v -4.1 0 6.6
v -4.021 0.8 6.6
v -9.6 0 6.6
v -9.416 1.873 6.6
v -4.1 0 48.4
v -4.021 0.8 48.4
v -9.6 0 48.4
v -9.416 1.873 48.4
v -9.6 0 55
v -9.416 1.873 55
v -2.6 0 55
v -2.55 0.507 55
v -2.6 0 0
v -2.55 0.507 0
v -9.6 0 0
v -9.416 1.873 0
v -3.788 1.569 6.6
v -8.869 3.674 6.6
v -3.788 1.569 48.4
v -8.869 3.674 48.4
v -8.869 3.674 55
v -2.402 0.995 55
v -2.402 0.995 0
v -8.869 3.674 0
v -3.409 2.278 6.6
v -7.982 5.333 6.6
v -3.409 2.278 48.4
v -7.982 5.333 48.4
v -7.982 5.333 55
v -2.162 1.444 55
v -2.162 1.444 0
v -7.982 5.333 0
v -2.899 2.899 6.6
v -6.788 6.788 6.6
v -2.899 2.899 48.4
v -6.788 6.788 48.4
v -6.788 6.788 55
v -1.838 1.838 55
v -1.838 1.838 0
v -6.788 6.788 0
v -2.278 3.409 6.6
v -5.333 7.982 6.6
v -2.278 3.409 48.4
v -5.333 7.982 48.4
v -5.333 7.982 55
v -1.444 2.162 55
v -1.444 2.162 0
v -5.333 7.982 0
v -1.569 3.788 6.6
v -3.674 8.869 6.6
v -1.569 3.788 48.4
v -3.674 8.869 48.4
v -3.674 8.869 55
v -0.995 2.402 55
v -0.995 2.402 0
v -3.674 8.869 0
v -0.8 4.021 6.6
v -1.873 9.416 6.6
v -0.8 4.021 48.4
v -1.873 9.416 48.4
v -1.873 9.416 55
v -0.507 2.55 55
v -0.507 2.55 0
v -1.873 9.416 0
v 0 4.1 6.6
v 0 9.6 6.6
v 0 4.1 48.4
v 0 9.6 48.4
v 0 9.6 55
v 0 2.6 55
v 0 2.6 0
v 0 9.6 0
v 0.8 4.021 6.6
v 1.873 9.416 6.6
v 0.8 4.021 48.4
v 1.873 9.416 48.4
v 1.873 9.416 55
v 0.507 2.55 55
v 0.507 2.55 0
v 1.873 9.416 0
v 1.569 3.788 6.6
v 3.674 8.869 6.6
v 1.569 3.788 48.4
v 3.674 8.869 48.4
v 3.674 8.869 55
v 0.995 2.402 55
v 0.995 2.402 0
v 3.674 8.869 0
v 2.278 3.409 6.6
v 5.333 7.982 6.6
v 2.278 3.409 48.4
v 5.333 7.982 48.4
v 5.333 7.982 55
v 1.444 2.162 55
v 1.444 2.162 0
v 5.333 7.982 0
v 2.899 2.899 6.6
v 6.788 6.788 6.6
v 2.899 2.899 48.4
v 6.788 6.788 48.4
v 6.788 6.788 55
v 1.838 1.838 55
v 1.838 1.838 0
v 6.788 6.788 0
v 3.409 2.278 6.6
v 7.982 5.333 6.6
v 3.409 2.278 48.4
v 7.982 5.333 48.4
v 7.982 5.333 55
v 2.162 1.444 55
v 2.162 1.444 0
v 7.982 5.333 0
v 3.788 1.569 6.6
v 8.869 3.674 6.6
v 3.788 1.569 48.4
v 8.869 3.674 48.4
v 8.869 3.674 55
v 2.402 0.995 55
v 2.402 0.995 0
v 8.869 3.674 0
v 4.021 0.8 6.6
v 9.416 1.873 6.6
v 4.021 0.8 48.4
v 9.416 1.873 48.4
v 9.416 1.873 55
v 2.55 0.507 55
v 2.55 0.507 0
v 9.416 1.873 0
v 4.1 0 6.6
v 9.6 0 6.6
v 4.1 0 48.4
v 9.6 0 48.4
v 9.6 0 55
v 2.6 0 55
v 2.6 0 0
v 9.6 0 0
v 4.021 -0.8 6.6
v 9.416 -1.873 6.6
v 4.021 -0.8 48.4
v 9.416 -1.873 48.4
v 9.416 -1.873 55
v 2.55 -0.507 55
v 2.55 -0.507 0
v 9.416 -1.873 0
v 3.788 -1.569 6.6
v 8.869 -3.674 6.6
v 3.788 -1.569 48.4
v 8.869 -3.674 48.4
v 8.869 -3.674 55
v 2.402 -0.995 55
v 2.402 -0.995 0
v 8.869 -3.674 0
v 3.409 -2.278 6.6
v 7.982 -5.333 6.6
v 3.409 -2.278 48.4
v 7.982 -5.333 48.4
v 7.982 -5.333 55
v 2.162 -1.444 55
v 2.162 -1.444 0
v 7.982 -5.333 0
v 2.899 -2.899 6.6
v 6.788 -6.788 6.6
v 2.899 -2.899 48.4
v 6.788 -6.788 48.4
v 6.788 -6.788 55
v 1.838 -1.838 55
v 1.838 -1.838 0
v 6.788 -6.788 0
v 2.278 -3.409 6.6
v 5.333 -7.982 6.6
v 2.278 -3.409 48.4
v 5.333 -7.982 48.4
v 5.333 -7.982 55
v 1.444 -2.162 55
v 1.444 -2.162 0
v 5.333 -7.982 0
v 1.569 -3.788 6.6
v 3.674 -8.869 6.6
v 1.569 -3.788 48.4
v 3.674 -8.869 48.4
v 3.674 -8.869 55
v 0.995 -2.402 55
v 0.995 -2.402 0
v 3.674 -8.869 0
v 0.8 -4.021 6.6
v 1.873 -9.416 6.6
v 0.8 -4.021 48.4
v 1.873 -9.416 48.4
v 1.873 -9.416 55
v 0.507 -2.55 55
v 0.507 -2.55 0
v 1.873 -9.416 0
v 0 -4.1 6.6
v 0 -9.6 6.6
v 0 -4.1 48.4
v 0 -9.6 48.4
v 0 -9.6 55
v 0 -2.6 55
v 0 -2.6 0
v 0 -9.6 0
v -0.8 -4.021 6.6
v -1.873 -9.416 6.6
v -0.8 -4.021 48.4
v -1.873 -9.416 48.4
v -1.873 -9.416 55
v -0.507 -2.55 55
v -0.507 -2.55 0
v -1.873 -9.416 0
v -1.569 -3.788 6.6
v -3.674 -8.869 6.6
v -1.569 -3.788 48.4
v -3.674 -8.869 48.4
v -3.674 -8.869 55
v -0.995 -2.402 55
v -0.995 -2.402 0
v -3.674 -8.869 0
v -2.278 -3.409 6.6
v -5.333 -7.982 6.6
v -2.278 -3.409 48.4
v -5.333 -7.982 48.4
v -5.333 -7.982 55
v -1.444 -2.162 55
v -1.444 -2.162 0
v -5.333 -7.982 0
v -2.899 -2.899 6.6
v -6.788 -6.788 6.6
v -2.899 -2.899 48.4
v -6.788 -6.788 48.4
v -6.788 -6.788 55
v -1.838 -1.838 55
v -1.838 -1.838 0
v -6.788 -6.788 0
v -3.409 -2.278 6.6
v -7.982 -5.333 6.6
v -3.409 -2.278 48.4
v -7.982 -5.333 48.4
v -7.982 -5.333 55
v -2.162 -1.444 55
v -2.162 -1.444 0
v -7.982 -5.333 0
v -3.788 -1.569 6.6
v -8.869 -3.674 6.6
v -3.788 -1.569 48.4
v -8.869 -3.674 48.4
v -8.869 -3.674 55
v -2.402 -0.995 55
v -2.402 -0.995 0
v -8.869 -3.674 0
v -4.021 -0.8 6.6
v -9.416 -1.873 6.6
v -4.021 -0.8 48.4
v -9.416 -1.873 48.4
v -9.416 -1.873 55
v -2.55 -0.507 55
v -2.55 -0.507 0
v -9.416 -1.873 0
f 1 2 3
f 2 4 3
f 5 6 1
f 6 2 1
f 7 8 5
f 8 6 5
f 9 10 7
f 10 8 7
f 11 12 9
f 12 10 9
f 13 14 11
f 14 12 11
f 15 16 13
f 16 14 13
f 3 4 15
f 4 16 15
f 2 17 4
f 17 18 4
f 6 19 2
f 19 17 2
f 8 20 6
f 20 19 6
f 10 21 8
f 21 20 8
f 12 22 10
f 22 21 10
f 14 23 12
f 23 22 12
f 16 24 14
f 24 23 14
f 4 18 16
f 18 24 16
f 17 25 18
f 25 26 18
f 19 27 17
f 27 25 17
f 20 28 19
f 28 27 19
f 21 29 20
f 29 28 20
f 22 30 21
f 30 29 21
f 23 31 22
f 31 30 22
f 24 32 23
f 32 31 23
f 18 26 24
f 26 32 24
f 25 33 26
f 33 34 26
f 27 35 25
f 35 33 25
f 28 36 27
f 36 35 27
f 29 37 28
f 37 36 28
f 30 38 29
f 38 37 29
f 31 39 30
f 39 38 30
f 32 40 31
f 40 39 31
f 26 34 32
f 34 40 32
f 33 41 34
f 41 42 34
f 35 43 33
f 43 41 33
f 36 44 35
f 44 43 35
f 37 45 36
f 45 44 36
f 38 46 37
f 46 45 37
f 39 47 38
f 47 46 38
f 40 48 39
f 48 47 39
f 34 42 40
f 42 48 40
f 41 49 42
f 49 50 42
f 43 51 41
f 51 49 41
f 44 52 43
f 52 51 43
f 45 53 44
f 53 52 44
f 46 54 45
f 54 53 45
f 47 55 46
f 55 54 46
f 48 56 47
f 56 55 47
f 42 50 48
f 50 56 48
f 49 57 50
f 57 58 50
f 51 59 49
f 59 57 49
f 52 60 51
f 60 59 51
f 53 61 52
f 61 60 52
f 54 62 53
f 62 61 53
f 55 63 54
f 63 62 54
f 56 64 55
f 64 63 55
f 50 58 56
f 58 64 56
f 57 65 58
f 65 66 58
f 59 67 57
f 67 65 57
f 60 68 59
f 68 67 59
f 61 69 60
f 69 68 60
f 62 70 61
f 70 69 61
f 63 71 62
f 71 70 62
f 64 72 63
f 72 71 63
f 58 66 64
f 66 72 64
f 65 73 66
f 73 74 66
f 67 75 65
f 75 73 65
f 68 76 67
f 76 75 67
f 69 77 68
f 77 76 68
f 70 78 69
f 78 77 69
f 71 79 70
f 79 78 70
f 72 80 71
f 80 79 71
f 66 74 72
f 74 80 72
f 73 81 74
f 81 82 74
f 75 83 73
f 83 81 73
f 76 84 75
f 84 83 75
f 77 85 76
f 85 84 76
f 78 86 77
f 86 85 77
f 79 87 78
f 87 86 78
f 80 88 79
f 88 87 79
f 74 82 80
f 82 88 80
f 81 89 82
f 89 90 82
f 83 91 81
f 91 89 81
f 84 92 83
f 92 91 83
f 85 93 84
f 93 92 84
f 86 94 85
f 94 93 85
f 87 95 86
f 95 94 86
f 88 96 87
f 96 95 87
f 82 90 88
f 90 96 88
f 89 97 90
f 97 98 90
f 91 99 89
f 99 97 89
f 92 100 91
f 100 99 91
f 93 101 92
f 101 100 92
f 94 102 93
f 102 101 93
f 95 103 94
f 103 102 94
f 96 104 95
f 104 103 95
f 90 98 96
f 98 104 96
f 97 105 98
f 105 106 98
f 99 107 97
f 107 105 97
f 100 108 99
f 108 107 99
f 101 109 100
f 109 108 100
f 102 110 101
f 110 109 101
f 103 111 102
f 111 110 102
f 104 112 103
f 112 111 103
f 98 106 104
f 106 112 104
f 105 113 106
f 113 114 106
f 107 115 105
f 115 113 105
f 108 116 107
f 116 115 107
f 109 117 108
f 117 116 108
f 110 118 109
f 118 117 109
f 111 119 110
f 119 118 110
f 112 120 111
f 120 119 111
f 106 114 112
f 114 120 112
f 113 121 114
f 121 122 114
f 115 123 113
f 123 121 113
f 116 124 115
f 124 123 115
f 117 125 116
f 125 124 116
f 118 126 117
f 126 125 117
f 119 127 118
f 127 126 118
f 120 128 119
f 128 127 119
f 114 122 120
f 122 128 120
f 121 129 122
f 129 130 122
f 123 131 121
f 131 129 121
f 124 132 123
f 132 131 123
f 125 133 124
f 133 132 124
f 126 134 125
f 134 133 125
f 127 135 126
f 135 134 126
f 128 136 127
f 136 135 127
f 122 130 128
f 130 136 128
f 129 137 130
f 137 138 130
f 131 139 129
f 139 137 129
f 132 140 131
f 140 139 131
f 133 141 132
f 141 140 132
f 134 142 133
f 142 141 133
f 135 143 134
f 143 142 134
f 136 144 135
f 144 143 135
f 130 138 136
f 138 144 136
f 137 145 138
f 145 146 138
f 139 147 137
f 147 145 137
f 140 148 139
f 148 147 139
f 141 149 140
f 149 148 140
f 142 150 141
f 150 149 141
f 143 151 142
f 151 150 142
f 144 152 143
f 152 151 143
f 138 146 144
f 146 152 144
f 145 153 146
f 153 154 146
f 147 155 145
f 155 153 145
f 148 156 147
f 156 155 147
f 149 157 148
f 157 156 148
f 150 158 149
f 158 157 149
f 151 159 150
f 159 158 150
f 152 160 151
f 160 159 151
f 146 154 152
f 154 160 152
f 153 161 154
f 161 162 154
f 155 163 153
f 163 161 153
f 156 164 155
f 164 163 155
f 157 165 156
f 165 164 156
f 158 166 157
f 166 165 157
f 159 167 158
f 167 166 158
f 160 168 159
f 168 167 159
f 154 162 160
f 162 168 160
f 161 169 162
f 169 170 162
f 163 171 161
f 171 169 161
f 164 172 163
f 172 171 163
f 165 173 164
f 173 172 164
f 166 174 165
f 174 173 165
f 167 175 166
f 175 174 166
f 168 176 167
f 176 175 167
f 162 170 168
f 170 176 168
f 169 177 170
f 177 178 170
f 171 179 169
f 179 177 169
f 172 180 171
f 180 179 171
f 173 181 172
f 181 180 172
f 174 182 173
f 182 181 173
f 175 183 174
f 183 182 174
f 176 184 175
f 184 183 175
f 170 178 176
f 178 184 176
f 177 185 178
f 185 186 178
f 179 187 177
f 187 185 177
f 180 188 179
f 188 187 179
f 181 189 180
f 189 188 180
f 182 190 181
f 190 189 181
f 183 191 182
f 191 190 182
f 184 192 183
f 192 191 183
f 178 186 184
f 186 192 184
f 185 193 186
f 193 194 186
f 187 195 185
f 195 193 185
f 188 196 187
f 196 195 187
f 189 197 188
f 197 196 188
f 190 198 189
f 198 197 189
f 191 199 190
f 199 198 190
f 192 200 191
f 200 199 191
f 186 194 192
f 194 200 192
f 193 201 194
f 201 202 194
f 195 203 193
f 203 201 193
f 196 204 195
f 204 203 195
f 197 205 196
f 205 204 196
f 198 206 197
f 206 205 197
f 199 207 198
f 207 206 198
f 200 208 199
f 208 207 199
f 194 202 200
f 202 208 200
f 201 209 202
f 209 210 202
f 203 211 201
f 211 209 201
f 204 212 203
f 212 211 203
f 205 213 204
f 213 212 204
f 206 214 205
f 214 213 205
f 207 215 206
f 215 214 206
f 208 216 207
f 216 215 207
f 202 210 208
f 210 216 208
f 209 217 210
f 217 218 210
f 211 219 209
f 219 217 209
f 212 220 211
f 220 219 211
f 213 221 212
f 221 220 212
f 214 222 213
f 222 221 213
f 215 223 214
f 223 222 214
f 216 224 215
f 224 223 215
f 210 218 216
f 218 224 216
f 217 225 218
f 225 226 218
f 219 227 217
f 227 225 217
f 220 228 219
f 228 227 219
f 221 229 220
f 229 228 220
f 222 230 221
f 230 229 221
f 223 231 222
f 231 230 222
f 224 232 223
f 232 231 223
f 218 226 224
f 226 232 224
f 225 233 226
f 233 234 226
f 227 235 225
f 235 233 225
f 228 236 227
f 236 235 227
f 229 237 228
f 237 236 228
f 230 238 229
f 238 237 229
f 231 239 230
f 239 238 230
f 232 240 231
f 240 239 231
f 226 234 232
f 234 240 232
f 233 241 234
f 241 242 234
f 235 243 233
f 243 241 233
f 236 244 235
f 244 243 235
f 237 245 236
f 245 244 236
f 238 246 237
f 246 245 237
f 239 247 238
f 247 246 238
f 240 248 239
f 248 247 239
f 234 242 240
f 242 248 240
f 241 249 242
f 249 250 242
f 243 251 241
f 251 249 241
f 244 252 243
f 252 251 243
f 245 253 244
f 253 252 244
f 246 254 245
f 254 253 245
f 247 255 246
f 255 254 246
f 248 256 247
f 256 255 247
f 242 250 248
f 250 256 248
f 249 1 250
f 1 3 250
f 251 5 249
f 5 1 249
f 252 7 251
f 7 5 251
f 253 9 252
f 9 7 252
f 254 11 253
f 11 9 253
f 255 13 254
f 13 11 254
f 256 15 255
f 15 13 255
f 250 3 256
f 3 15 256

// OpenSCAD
$fn = 32;

// ----------------------------------------------------------------------
// Profiled standoff: spool spacer, 55 mm long, bore 5.2 mm
// ----------------------------------------------------------------------

// --- parameters (mm) ---
revolve_angle = 360;      // full turn around the Z axis
profile_points = 8;       // points of the closed outline

profile = [[2.6, 0], [9.6, 0], [9.6, 6.6], [4.1, 6.6], [4.1, 48.4], [9.6, 48.4], [9.6, 55], [2.6, 55]];  // single closed polygon, 8 points, counter clockwise

// --- the one profile operation ---
rotate_extrude(angle = revolve_angle) polygon(points = profile);
